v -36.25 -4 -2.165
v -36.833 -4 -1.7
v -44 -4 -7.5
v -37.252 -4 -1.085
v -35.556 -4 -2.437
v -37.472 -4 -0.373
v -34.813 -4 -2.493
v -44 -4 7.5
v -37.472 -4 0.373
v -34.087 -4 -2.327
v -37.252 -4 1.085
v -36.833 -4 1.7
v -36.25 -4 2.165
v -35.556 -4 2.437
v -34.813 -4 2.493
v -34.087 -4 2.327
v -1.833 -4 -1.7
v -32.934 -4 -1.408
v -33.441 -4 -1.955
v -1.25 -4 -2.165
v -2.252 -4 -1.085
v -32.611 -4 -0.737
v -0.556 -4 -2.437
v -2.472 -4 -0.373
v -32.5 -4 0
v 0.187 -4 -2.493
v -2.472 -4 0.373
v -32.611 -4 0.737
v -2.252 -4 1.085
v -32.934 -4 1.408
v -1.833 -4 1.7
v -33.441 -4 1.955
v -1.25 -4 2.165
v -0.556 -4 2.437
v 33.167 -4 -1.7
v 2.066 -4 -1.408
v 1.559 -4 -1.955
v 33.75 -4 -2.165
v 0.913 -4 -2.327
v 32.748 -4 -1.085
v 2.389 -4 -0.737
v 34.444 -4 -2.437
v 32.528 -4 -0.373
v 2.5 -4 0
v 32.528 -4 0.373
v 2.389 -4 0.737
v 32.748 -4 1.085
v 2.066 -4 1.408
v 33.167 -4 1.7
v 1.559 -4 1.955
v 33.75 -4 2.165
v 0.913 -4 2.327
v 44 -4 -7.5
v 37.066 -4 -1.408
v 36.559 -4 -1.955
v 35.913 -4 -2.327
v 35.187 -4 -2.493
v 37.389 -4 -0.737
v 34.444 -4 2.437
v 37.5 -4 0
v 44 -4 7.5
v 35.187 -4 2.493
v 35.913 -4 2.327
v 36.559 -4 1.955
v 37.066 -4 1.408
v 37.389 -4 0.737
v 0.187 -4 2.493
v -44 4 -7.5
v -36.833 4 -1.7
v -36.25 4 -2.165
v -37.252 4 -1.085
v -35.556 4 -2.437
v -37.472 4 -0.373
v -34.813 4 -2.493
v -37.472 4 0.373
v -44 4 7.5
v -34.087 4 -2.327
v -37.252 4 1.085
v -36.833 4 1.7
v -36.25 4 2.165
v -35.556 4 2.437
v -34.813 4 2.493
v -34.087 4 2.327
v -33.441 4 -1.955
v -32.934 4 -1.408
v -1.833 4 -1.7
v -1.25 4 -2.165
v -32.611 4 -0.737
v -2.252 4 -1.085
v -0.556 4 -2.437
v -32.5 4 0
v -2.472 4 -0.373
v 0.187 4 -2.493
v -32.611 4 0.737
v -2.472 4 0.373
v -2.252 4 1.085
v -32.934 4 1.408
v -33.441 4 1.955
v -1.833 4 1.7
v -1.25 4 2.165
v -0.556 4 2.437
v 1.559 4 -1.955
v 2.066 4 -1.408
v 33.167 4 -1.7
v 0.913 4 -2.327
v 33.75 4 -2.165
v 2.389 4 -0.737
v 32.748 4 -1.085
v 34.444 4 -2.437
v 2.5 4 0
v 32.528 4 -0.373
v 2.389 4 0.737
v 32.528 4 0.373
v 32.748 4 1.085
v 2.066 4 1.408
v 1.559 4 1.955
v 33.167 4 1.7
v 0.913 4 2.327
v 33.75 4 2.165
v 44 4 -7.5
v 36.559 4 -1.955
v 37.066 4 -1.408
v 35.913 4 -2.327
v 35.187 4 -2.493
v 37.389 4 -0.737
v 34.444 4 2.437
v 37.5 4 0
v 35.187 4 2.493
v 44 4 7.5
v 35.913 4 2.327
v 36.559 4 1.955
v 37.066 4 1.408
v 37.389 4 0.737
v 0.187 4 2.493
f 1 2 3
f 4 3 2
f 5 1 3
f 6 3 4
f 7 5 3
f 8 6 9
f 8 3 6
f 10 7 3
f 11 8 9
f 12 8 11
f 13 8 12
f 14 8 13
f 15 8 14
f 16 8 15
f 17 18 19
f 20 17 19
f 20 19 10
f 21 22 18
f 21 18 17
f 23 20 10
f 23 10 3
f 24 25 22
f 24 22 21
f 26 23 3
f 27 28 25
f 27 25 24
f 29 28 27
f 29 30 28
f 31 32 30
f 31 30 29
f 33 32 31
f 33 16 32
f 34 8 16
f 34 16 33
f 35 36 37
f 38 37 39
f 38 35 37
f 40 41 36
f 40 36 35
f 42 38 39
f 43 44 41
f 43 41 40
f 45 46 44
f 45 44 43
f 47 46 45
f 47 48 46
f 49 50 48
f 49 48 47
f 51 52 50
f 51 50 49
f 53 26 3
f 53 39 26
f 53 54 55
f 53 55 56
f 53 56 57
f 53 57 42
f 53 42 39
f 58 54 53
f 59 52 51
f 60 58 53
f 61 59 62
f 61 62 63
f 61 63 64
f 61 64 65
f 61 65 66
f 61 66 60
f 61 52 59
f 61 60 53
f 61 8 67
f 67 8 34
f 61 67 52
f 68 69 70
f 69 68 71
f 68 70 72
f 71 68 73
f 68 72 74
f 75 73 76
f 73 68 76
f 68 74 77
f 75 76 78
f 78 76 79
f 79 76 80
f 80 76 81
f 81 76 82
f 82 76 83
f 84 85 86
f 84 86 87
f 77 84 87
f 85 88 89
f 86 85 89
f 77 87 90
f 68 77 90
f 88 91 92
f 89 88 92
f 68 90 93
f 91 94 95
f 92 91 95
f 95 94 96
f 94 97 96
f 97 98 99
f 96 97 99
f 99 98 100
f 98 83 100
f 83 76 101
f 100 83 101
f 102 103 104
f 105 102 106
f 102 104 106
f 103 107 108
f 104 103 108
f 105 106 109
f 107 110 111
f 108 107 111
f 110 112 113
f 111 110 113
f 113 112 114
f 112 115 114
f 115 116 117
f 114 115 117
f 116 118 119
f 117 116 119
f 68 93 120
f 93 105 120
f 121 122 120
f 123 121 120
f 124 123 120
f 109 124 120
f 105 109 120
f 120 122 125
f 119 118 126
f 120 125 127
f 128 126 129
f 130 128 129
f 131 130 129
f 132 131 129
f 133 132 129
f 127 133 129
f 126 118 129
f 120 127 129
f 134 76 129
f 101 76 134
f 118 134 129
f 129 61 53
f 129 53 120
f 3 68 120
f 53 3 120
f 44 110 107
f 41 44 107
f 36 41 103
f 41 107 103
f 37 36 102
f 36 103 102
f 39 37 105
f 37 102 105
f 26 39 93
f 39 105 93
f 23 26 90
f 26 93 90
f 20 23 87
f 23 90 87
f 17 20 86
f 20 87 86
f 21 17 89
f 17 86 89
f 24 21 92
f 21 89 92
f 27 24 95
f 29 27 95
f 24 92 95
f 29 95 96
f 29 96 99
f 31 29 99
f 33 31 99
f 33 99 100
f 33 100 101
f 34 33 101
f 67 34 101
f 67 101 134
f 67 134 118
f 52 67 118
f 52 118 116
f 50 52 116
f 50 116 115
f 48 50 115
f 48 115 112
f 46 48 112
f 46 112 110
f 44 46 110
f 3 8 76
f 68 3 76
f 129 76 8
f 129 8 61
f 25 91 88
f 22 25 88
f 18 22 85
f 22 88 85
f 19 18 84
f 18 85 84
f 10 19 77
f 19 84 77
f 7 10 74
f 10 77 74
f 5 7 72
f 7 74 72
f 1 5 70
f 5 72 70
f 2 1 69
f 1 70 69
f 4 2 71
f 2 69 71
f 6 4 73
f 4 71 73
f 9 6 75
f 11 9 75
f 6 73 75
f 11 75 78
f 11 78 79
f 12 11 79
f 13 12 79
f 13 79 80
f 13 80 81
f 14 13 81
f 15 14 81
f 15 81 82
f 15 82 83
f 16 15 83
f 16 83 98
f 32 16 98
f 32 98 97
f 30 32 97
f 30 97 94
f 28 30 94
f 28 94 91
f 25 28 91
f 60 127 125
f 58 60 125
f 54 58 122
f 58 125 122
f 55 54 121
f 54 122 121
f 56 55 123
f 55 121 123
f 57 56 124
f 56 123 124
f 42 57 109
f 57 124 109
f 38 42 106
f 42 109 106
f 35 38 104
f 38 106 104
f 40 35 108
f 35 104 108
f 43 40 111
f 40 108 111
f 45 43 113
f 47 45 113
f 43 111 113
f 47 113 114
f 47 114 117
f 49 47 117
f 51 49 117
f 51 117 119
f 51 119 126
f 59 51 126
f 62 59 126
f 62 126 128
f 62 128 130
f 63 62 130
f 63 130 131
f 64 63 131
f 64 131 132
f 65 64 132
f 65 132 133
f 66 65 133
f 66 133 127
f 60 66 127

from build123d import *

# Parameters (mm, degrees)
SKETCH_2_W         = 88
SKETCH_2_H         = 8
EXTRUDE_1_DEPTH    = 7.5
HOLE_WIZARD_M6_1_D = 5


with BuildPart() as part:
    # 草图2 → 凸台-拉伸1 (new, symmetric)
    with BuildSketch(Plane.XY):
        Rectangle(SKETCH_2_W, SKETCH_2_H)
    extrude(amount=EXTRUDE_1_DEPTH, both=True)

    # M6 螺纹孔1 (through all)
    with Locations(Plane(origin=(0, -4, 0), x_dir=(-1, 0, 0), z_dir=(0, -1, 0))):
        with Locations((35, 0), (-35, 0), (0, 0)):
            Hole(HOLE_WIZARD_M6_1_D / 2)


solid = part.part
